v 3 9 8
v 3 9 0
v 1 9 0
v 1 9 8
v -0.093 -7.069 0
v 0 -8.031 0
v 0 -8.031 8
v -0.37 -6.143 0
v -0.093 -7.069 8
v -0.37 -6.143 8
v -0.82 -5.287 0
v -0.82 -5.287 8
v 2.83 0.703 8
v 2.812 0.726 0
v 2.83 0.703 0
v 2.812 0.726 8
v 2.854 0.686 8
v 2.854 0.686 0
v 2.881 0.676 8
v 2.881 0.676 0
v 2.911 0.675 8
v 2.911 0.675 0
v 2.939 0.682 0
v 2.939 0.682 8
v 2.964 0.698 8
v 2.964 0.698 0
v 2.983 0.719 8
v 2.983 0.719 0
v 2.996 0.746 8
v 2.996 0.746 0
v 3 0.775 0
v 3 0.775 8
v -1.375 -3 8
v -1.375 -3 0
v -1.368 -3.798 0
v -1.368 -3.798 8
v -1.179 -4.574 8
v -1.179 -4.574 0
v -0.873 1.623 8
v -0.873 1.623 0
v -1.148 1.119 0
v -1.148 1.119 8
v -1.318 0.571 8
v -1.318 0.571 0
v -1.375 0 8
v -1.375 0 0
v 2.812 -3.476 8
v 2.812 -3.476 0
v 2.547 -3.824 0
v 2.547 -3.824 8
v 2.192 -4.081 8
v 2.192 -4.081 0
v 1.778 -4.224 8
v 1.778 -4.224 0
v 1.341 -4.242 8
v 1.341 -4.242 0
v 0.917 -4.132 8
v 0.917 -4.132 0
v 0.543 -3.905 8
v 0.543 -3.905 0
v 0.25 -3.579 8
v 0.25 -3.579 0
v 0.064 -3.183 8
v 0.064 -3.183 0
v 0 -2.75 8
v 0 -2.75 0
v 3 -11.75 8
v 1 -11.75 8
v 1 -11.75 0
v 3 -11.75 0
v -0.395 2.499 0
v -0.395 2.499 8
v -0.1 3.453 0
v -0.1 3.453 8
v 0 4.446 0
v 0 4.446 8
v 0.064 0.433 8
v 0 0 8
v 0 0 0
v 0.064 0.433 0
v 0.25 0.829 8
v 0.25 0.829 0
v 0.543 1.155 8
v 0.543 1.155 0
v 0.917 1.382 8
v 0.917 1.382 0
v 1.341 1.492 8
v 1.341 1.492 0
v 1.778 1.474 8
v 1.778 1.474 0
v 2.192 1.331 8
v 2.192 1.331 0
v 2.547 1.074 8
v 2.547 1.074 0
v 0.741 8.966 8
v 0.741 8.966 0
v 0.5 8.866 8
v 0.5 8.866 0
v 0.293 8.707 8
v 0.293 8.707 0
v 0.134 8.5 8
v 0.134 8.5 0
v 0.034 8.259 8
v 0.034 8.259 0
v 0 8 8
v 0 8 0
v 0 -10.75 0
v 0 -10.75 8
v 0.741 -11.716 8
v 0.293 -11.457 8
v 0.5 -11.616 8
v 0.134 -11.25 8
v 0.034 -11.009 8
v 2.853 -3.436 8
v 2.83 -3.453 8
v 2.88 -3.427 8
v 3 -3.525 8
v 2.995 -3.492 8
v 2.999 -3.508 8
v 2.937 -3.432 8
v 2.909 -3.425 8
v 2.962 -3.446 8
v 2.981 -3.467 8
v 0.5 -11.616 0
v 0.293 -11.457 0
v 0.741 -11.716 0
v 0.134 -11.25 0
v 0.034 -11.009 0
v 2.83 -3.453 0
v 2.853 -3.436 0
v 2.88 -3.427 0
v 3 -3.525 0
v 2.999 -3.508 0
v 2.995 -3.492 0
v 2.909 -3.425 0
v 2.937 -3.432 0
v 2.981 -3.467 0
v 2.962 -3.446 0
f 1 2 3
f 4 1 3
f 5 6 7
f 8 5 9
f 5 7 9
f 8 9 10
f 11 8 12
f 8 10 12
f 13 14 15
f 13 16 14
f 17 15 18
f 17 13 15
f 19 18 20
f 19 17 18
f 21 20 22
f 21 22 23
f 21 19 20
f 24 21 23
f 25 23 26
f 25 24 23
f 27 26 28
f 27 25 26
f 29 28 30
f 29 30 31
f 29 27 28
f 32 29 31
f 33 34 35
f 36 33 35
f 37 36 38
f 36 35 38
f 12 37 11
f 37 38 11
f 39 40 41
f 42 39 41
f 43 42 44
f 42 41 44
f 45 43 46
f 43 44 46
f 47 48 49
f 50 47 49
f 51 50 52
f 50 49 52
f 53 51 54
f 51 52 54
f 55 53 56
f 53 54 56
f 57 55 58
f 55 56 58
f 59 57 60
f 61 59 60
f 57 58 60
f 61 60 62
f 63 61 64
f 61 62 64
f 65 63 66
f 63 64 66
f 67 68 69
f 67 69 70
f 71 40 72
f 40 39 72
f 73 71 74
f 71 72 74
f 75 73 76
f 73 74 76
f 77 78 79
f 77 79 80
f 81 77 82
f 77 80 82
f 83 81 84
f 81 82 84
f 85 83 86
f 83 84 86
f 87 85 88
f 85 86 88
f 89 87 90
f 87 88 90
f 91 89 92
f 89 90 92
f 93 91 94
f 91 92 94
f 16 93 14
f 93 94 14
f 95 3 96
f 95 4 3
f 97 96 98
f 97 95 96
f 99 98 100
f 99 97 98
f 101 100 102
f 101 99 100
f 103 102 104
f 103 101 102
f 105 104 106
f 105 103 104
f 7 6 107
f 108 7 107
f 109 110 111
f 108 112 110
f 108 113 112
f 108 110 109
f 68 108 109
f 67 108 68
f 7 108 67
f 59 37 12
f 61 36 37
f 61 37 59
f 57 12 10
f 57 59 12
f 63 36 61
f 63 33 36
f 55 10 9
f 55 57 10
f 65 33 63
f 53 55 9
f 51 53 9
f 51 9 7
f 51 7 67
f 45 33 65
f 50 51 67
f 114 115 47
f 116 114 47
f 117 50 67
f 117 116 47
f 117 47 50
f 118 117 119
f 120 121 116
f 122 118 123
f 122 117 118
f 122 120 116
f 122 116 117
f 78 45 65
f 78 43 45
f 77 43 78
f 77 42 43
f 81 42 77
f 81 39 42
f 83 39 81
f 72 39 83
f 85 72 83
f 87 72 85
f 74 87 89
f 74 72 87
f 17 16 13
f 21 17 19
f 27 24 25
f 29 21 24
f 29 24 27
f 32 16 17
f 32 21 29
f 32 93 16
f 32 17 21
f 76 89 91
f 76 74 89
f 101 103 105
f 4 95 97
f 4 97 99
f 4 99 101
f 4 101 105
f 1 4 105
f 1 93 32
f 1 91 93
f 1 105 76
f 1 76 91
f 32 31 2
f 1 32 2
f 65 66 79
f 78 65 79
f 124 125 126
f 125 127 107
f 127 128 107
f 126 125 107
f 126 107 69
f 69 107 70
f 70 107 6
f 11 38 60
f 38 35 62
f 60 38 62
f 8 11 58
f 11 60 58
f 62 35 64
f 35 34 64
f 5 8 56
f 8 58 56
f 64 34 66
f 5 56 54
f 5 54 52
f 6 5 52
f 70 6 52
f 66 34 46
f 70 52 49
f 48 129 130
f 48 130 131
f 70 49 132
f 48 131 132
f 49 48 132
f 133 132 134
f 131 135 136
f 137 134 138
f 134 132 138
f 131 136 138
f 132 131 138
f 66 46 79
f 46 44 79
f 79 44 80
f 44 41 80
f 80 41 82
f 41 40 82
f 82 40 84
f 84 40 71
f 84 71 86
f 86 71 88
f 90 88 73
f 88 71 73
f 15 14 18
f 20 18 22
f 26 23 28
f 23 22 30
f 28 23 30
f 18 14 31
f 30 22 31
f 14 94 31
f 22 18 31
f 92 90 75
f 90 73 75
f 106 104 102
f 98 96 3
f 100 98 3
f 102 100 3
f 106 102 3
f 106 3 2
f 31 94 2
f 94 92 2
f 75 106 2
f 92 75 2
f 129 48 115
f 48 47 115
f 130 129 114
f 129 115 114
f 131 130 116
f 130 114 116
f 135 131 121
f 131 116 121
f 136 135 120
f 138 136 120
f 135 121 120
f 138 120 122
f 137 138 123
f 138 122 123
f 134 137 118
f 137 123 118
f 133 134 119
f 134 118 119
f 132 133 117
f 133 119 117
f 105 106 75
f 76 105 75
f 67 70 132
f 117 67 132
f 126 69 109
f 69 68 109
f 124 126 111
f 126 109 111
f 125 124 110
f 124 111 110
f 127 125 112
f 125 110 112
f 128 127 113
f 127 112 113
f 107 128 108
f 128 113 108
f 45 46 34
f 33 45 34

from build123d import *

# Parameters (mm, degrees)
F1_DEPTH = 8
F2_R     = 0.1
F3_R     = 1
F4_R     = 5


with BuildPart() as f1:
    # F0 (on Top) → F1 (new body)
    with BuildSketch(Plane.XY):
        with BuildLine():
            Line((0, -2.75), (0, 0))
            ThreePointArc((0, 0), (1.5, 1.5), (3, 0))
            Line((3, 0), (3, 9))
            Line((3, 9), (0, 9))
            Line((0, 9), (0, 2.4526771088))
            ThreePointArc((0, 2.4526771088), (-1.007800331, 1.4059027349), (-1.375, 0))
            Line((-1.375, 0), (-1.375, -3))
            ThreePointArc((-1.375, -3), (-1.1039614046, -4.7622217371), (0, -6.1622776602))
            Line((0, -6.1622776602), (0, -11.75))
            Line((0, -11.75), (3, -11.75))
            Line((3, -11.75), (3, -2.75))
            ThreePointArc((3, -2.75), (1.5, -4.25), (0, -2.75))
        make_face()
    extrude(amount=F1_DEPTH)

    # F2 (call 1 of 2: OpenCascade refuses the feature's edges together)
    f2_edges = [f1.edges().sort_by_distance(p)[0] for p in [
        (3, 0, 4),
    ]]
    fillet(f2_edges, radius=F2_R)

    # F2#2 (call 2 of 2)
    f2_2_edges = [f1.edges().sort_by_distance(p)[0] for p in [
        (3, -2.75, 4),
    ]]
    fillet(f2_2_edges, radius=F2_R)

    # F3
    f3_edges = [f1.edges().sort_by_distance(p)[0] for p in [
        (0, 9, 4),
        (0, -11.75, 4),
    ]]
    fillet(f3_edges, radius=F3_R)

    # F4
    f4_edges = [f1.edges().sort_by_distance(p)[0] for p in [
        (0, 2.452677, 4),
        (0, -6.162278, 4),
    ]]
    fillet(f4_edges, radius=F4_R)


solid = f1.part
